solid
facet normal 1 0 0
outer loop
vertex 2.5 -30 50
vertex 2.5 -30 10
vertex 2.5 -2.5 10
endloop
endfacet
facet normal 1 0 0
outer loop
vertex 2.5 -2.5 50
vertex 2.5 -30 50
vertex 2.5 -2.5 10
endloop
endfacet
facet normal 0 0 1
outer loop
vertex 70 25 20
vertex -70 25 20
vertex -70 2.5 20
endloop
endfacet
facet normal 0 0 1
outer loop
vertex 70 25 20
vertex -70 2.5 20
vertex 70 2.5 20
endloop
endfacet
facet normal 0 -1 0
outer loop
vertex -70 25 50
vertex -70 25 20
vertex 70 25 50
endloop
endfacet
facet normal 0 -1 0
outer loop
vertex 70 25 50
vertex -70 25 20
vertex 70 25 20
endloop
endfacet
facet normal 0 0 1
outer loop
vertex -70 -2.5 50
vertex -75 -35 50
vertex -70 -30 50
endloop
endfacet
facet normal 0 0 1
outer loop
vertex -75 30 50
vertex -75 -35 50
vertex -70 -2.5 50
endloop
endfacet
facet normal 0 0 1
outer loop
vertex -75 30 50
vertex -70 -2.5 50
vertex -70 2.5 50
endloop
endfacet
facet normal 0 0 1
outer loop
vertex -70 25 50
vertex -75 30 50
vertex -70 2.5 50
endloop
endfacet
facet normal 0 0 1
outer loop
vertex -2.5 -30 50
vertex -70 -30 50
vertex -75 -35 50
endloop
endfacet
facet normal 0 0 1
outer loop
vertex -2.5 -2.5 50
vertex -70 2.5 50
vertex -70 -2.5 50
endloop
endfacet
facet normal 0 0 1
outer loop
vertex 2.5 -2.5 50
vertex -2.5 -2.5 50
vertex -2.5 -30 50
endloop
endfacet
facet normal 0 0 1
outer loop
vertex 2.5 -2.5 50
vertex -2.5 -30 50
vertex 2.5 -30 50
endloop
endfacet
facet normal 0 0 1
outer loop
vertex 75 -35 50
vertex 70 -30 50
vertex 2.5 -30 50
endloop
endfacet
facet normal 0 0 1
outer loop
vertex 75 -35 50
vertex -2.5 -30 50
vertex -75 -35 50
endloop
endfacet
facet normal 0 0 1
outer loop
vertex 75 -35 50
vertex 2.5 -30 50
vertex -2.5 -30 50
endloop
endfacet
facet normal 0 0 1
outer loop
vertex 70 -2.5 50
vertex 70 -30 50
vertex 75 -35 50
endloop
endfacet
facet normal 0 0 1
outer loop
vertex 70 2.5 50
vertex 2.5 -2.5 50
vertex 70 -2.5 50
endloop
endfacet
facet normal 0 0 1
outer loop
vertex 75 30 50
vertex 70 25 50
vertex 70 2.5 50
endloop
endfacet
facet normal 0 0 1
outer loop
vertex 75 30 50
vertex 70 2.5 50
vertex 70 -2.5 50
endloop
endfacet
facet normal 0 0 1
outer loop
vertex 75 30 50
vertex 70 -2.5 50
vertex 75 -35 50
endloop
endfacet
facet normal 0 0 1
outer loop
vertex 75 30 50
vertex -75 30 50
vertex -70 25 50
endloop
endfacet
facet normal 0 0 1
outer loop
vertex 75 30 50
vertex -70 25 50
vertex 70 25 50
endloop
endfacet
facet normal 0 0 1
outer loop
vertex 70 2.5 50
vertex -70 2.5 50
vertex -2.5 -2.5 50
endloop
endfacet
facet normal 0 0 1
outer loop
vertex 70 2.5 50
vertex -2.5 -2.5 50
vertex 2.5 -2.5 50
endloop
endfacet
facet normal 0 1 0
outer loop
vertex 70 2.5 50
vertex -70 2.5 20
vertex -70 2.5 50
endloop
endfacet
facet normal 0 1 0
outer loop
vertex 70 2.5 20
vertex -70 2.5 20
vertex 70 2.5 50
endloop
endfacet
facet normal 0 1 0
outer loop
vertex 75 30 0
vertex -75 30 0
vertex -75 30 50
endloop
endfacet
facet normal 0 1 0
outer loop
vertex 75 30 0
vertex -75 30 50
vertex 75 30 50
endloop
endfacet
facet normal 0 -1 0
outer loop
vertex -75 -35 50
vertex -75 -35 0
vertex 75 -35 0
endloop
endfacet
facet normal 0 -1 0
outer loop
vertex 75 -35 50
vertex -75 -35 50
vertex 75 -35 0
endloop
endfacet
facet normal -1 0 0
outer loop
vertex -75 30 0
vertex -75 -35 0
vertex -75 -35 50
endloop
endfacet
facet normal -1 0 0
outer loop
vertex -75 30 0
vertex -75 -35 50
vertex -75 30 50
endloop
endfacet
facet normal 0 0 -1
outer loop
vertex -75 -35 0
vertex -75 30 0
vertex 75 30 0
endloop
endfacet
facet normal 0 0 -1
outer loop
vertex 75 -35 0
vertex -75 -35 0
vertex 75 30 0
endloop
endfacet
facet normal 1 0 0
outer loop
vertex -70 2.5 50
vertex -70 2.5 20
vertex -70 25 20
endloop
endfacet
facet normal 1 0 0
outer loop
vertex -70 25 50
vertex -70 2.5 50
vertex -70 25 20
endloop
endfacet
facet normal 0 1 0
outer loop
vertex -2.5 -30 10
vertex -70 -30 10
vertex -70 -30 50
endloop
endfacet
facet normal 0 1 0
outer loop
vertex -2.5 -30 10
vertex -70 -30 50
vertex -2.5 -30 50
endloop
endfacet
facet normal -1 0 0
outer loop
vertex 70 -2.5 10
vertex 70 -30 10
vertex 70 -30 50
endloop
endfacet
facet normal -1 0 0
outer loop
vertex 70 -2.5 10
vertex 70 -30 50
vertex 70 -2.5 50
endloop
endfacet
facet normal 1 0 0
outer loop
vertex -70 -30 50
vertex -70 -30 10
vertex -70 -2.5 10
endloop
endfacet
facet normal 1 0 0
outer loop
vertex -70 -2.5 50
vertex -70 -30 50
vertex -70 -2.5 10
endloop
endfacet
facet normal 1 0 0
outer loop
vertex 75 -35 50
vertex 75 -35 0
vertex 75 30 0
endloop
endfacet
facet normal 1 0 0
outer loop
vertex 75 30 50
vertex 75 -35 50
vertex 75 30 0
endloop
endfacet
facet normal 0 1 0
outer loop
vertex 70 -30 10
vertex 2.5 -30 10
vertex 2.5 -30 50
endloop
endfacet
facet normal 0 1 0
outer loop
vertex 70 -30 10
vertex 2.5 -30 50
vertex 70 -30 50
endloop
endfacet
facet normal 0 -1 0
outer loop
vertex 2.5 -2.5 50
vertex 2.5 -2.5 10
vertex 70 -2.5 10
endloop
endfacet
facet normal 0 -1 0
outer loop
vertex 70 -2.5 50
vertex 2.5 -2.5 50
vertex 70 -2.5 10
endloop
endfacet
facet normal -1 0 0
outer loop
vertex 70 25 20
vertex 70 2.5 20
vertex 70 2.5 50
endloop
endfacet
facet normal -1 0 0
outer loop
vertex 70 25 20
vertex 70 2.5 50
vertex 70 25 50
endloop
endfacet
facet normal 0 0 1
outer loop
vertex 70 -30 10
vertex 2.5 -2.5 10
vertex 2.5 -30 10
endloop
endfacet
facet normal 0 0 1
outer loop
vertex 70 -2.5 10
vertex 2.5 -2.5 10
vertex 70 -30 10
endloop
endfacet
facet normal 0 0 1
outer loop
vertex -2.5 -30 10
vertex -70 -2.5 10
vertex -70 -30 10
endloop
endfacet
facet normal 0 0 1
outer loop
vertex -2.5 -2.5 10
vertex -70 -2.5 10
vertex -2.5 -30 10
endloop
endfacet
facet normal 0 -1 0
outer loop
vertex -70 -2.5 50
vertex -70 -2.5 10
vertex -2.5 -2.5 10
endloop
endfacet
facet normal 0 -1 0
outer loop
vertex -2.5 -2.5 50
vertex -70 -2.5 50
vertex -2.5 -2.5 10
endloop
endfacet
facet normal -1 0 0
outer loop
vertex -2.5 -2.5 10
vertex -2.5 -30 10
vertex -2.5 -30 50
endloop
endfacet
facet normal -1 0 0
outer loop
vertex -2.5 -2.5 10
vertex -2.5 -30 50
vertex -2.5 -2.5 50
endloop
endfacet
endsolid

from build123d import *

# Parameters (mm, degrees)
F0_W     = 150
F0_H     = 65
F0_W_2   = 67.5
F0_H_2   = 27.5
F0_W_3   = 140
F0_H_3   = 22.5
F1_DEPTH = 50
F2_DEPTH = 20
F3_DEPTH = 10


with BuildPart() as f1:
    # F0 (on Top) → F1 (new body)
    with BuildSketch(Plane.XY):
        with Locations((0, -2.5)):
            Rectangle(F0_W, F0_H)
        with Locations((-36.25, -16.25)):
            Rectangle(F0_W_2, F0_H_2, mode=Mode.SUBTRACT)
        with Locations((36.25, -16.25)):
            Rectangle(F0_W_2, F0_H_2, mode=Mode.SUBTRACT)
        with Locations((0, 13.75)):
            Rectangle(F0_W_3, F0_H_3, mode=Mode.SUBTRACT)
    extrude(amount=F1_DEPTH)

    # F0 (on Top) → F2 (join)
    with BuildSketch(Plane.XY):
        with Locations((0, 13.75)):
            Rectangle(F0_W_3, F0_H_3)
    extrude(amount=F2_DEPTH)

    # F0 (on Top) → F3 (join)
    with BuildSketch(Plane.XY):
        with Locations((-36.25, -16.25)):
            Rectangle(F0_W_2, F0_H_2)
        with Locations((36.25, -16.25)):
            Rectangle(F0_W_2, F0_H_2)
    extrude(amount=F3_DEPTH)


solid = f1.part
